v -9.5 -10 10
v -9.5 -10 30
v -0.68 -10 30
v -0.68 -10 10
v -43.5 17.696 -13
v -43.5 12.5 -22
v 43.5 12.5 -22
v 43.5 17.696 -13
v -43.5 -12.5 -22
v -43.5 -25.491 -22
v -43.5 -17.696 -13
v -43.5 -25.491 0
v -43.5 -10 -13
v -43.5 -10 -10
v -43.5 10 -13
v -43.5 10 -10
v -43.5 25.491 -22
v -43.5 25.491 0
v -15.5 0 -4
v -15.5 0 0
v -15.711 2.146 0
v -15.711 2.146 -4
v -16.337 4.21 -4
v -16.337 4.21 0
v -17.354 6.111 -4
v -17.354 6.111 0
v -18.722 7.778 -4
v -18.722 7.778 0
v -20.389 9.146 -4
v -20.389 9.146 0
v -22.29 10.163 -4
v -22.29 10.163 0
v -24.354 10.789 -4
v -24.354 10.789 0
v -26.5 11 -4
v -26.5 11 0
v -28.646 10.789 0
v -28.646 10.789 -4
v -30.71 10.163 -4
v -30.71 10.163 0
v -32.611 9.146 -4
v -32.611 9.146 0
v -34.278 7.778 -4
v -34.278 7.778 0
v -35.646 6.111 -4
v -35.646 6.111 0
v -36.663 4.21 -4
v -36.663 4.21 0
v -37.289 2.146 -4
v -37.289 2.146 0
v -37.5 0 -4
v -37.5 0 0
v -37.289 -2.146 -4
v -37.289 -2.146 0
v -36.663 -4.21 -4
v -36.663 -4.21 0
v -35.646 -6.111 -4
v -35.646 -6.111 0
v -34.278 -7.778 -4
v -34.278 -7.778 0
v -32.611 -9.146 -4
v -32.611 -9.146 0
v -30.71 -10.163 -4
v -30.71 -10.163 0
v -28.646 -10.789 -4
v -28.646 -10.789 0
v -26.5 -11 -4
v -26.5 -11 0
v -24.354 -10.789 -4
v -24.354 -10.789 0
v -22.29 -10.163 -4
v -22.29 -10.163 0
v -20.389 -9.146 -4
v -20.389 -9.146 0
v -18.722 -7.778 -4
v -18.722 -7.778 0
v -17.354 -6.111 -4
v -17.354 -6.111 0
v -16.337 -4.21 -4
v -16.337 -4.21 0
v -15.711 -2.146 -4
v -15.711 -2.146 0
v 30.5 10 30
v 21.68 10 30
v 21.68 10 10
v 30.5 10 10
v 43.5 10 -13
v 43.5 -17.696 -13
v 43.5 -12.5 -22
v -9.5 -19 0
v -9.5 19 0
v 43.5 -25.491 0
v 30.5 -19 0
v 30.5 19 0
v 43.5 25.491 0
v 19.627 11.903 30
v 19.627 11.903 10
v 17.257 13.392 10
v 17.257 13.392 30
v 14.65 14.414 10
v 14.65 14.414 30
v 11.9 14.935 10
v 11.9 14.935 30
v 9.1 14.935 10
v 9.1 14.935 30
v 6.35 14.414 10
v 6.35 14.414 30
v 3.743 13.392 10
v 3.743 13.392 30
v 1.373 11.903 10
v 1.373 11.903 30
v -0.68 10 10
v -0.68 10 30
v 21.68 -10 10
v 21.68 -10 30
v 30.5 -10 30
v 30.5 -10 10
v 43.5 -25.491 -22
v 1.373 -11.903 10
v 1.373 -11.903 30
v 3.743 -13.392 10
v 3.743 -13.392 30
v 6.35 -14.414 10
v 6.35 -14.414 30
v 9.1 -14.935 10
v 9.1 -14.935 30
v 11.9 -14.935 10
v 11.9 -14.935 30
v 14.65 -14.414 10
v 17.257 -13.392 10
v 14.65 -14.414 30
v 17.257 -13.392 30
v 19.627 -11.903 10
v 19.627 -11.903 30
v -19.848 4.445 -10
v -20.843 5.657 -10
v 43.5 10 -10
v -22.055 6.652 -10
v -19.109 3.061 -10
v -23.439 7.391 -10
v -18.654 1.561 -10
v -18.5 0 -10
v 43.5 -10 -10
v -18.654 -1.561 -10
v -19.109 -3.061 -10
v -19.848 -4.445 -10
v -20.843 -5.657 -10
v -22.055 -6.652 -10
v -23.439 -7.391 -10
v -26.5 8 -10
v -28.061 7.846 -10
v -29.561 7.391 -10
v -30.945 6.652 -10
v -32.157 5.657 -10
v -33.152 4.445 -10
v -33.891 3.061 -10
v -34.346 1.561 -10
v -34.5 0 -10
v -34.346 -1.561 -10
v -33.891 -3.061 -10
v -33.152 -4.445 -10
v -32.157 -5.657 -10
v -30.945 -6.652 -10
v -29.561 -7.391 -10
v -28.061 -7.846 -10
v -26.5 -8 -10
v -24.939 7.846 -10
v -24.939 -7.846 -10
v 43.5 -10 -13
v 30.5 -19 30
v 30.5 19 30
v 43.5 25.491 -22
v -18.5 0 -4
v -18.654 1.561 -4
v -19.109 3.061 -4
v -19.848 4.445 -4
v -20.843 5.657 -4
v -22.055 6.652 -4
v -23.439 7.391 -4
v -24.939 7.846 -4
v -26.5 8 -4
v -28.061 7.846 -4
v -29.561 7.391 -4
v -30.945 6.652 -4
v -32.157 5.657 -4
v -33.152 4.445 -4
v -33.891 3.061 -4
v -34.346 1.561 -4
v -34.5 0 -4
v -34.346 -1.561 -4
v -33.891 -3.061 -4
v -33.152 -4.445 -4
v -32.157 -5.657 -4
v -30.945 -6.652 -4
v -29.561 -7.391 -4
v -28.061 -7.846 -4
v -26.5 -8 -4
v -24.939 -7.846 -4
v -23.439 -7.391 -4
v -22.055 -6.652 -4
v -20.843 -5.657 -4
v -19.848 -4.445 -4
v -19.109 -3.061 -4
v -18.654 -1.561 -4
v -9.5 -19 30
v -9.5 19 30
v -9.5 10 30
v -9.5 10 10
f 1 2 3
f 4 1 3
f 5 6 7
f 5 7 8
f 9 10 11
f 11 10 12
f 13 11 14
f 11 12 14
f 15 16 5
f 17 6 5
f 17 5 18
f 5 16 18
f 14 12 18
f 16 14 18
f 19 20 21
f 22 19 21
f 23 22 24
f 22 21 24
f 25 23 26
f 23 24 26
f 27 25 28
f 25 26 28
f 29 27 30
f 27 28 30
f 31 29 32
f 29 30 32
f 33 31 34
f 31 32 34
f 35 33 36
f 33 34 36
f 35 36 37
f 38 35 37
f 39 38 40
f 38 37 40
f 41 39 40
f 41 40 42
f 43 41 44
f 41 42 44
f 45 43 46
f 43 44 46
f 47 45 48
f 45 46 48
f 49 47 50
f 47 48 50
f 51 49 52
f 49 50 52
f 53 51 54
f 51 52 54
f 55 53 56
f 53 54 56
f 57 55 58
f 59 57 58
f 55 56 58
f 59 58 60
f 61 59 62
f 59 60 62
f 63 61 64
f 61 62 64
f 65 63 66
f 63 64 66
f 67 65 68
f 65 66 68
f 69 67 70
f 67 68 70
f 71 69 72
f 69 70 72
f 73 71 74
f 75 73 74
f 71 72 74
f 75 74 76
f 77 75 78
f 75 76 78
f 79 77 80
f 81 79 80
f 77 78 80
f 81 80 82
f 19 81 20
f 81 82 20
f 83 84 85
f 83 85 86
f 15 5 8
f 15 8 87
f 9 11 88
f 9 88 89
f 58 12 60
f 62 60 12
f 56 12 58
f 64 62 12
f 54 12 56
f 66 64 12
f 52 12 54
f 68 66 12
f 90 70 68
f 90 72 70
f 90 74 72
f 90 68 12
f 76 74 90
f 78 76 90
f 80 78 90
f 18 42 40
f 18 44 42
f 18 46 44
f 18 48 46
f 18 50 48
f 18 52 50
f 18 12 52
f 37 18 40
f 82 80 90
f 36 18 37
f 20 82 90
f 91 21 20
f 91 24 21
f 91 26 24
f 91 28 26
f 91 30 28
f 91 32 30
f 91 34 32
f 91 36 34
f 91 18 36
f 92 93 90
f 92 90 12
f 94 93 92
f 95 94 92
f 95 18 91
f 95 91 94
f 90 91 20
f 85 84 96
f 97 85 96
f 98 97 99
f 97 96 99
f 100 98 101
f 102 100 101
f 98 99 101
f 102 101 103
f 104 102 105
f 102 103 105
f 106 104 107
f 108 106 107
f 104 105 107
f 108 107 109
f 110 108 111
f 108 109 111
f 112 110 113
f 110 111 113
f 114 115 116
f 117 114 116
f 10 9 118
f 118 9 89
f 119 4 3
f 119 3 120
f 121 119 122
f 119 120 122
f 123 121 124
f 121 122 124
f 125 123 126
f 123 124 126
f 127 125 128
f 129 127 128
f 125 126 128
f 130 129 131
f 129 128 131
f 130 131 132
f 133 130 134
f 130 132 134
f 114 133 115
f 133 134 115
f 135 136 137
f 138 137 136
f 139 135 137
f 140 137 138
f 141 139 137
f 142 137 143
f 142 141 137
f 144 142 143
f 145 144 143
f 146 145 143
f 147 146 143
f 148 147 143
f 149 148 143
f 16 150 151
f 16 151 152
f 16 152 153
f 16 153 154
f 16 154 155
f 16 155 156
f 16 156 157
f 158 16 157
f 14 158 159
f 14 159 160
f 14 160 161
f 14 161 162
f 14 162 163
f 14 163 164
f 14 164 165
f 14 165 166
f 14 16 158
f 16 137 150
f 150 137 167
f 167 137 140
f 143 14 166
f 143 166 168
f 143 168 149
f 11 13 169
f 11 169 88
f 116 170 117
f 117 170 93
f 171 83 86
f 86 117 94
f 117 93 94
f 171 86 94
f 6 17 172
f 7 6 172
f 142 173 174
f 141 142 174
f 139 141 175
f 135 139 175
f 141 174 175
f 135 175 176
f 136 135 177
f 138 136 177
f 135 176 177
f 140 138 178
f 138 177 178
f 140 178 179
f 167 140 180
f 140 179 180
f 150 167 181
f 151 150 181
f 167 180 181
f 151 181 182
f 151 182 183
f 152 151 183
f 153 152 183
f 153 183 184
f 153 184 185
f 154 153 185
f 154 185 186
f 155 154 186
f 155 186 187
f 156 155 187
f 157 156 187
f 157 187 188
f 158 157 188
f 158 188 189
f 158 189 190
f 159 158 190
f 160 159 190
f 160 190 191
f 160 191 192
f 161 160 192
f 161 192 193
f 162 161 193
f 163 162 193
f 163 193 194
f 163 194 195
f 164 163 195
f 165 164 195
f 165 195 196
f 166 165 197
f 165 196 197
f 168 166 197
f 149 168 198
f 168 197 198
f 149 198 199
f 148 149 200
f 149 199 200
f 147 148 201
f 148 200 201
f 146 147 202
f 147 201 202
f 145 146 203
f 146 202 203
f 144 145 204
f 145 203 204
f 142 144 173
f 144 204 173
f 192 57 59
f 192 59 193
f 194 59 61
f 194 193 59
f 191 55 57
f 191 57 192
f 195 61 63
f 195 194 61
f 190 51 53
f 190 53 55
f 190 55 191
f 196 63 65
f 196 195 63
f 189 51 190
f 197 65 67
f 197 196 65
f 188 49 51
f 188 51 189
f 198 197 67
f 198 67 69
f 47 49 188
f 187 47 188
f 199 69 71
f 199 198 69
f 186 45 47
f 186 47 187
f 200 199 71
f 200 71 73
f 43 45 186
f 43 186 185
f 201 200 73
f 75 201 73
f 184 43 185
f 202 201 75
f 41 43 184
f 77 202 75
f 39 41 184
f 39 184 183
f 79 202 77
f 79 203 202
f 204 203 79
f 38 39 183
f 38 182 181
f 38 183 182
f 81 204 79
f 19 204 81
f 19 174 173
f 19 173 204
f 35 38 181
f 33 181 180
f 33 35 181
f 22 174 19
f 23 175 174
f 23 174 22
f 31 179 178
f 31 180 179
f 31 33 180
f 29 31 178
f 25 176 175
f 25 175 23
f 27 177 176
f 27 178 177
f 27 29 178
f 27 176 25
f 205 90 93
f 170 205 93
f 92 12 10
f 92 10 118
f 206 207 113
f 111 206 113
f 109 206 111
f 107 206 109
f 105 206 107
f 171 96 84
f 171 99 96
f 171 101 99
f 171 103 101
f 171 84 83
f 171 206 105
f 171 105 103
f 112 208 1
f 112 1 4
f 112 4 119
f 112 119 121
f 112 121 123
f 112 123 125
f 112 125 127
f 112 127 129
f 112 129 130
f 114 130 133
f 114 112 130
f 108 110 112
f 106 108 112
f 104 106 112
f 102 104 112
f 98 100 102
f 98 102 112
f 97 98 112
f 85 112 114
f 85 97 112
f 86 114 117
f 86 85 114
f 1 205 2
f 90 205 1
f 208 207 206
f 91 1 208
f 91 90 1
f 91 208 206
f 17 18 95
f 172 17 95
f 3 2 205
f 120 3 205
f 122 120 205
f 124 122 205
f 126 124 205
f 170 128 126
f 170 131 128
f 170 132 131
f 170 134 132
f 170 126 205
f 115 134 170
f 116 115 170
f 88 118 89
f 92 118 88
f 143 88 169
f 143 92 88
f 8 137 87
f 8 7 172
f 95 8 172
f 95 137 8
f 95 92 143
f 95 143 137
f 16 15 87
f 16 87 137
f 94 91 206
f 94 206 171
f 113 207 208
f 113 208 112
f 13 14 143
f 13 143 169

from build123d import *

# Parameters (mm, degrees)
SKETCH1_W         = 87
SKETCH1_H         = 50.982
BASE_YELLOW_DEPTH = 22
SKETCH2_R         = 11
COUNTERBOR_DEPTH  = 4
SKETCH2_5_R       = 8
COUNTERBOR2_DEPTH = 56.009463559
SKETCH5_W         = 40
SKETCH5_H         = 38
BASE_RED_DEPTH    = 30
BASE_PURPLE_DEPTH = 20
BASE_TURKIZ_DEPTH = 96.492361375


with BuildPart() as part:
    # Sketch1 → base-yellow (new body)
    with BuildSketch(Plane.XY):
        Rectangle(SKETCH1_W, SKETCH1_H)
    extrude(amount=-BASE_YELLOW_DEPTH)

    # Sketch2 → counterbor (cut)
    with BuildSketch(Plane.XY):
        with Locations((-26.5, 0)):
            Circle(SKETCH2_R)
    extrude(amount=-COUNTERBOR_DEPTH, mode=Mode.SUBTRACT)

    # Sketch2<5> → counterbor2 (cut, through all)
    with BuildSketch(Plane.XY):
        with Locations((-26.5, 0)):
            Circle(SKETCH2_5_R)
    extrude(amount=-COUNTERBOR2_DEPTH, mode=Mode.SUBTRACT)

    # Sketch5 → base-red (add)
    with BuildSketch(Plane.XY):
        with Locations((10.5, 0)):
            Rectangle(SKETCH5_W, SKETCH5_H)
    extrude(amount=BASE_RED_DEPTH)

    # Sketch7 → base-purple (cut)
    with BuildSketch(Plane.XY.offset(30)):
        with BuildLine():
            Line((-9.5, 10), (-9.5, -10))
            Line((-9.5, -10), (-0.680339887, -10))
            ThreePointArc((-0.680339887, -10), (10.5, -15), (21.680339887, -10))
            Line((21.680339887, -10), (30.5, -10))
            Line((30.5, -10), (30.5, 10))
            Line((30.5, 10), (21.680339887, 10))
            ThreePointArc((21.680339887, 10), (10.5, 15), (-0.680339887, 10))
            Line((-0.680339887, 10), (-9.5, 10))
        make_face()
    extrude(amount=-BASE_PURPLE_DEPTH, mode=Mode.SUBTRACT)

    # Sketch8 → base-turkiz (cut, through all)
    with BuildSketch(Plane.ZY.offset(43.5)):
        Polygon((-10, 10), (-10, -10), (-13, -10), (-13, -17.696152423), (-22, -12.5), (-22, 12.5), (-13, 17.696152423), (-13, 10), align=None)
    extrude(amount=-BASE_TURKIZ_DEPTH, mode=Mode.SUBTRACT)


solid = part.part
